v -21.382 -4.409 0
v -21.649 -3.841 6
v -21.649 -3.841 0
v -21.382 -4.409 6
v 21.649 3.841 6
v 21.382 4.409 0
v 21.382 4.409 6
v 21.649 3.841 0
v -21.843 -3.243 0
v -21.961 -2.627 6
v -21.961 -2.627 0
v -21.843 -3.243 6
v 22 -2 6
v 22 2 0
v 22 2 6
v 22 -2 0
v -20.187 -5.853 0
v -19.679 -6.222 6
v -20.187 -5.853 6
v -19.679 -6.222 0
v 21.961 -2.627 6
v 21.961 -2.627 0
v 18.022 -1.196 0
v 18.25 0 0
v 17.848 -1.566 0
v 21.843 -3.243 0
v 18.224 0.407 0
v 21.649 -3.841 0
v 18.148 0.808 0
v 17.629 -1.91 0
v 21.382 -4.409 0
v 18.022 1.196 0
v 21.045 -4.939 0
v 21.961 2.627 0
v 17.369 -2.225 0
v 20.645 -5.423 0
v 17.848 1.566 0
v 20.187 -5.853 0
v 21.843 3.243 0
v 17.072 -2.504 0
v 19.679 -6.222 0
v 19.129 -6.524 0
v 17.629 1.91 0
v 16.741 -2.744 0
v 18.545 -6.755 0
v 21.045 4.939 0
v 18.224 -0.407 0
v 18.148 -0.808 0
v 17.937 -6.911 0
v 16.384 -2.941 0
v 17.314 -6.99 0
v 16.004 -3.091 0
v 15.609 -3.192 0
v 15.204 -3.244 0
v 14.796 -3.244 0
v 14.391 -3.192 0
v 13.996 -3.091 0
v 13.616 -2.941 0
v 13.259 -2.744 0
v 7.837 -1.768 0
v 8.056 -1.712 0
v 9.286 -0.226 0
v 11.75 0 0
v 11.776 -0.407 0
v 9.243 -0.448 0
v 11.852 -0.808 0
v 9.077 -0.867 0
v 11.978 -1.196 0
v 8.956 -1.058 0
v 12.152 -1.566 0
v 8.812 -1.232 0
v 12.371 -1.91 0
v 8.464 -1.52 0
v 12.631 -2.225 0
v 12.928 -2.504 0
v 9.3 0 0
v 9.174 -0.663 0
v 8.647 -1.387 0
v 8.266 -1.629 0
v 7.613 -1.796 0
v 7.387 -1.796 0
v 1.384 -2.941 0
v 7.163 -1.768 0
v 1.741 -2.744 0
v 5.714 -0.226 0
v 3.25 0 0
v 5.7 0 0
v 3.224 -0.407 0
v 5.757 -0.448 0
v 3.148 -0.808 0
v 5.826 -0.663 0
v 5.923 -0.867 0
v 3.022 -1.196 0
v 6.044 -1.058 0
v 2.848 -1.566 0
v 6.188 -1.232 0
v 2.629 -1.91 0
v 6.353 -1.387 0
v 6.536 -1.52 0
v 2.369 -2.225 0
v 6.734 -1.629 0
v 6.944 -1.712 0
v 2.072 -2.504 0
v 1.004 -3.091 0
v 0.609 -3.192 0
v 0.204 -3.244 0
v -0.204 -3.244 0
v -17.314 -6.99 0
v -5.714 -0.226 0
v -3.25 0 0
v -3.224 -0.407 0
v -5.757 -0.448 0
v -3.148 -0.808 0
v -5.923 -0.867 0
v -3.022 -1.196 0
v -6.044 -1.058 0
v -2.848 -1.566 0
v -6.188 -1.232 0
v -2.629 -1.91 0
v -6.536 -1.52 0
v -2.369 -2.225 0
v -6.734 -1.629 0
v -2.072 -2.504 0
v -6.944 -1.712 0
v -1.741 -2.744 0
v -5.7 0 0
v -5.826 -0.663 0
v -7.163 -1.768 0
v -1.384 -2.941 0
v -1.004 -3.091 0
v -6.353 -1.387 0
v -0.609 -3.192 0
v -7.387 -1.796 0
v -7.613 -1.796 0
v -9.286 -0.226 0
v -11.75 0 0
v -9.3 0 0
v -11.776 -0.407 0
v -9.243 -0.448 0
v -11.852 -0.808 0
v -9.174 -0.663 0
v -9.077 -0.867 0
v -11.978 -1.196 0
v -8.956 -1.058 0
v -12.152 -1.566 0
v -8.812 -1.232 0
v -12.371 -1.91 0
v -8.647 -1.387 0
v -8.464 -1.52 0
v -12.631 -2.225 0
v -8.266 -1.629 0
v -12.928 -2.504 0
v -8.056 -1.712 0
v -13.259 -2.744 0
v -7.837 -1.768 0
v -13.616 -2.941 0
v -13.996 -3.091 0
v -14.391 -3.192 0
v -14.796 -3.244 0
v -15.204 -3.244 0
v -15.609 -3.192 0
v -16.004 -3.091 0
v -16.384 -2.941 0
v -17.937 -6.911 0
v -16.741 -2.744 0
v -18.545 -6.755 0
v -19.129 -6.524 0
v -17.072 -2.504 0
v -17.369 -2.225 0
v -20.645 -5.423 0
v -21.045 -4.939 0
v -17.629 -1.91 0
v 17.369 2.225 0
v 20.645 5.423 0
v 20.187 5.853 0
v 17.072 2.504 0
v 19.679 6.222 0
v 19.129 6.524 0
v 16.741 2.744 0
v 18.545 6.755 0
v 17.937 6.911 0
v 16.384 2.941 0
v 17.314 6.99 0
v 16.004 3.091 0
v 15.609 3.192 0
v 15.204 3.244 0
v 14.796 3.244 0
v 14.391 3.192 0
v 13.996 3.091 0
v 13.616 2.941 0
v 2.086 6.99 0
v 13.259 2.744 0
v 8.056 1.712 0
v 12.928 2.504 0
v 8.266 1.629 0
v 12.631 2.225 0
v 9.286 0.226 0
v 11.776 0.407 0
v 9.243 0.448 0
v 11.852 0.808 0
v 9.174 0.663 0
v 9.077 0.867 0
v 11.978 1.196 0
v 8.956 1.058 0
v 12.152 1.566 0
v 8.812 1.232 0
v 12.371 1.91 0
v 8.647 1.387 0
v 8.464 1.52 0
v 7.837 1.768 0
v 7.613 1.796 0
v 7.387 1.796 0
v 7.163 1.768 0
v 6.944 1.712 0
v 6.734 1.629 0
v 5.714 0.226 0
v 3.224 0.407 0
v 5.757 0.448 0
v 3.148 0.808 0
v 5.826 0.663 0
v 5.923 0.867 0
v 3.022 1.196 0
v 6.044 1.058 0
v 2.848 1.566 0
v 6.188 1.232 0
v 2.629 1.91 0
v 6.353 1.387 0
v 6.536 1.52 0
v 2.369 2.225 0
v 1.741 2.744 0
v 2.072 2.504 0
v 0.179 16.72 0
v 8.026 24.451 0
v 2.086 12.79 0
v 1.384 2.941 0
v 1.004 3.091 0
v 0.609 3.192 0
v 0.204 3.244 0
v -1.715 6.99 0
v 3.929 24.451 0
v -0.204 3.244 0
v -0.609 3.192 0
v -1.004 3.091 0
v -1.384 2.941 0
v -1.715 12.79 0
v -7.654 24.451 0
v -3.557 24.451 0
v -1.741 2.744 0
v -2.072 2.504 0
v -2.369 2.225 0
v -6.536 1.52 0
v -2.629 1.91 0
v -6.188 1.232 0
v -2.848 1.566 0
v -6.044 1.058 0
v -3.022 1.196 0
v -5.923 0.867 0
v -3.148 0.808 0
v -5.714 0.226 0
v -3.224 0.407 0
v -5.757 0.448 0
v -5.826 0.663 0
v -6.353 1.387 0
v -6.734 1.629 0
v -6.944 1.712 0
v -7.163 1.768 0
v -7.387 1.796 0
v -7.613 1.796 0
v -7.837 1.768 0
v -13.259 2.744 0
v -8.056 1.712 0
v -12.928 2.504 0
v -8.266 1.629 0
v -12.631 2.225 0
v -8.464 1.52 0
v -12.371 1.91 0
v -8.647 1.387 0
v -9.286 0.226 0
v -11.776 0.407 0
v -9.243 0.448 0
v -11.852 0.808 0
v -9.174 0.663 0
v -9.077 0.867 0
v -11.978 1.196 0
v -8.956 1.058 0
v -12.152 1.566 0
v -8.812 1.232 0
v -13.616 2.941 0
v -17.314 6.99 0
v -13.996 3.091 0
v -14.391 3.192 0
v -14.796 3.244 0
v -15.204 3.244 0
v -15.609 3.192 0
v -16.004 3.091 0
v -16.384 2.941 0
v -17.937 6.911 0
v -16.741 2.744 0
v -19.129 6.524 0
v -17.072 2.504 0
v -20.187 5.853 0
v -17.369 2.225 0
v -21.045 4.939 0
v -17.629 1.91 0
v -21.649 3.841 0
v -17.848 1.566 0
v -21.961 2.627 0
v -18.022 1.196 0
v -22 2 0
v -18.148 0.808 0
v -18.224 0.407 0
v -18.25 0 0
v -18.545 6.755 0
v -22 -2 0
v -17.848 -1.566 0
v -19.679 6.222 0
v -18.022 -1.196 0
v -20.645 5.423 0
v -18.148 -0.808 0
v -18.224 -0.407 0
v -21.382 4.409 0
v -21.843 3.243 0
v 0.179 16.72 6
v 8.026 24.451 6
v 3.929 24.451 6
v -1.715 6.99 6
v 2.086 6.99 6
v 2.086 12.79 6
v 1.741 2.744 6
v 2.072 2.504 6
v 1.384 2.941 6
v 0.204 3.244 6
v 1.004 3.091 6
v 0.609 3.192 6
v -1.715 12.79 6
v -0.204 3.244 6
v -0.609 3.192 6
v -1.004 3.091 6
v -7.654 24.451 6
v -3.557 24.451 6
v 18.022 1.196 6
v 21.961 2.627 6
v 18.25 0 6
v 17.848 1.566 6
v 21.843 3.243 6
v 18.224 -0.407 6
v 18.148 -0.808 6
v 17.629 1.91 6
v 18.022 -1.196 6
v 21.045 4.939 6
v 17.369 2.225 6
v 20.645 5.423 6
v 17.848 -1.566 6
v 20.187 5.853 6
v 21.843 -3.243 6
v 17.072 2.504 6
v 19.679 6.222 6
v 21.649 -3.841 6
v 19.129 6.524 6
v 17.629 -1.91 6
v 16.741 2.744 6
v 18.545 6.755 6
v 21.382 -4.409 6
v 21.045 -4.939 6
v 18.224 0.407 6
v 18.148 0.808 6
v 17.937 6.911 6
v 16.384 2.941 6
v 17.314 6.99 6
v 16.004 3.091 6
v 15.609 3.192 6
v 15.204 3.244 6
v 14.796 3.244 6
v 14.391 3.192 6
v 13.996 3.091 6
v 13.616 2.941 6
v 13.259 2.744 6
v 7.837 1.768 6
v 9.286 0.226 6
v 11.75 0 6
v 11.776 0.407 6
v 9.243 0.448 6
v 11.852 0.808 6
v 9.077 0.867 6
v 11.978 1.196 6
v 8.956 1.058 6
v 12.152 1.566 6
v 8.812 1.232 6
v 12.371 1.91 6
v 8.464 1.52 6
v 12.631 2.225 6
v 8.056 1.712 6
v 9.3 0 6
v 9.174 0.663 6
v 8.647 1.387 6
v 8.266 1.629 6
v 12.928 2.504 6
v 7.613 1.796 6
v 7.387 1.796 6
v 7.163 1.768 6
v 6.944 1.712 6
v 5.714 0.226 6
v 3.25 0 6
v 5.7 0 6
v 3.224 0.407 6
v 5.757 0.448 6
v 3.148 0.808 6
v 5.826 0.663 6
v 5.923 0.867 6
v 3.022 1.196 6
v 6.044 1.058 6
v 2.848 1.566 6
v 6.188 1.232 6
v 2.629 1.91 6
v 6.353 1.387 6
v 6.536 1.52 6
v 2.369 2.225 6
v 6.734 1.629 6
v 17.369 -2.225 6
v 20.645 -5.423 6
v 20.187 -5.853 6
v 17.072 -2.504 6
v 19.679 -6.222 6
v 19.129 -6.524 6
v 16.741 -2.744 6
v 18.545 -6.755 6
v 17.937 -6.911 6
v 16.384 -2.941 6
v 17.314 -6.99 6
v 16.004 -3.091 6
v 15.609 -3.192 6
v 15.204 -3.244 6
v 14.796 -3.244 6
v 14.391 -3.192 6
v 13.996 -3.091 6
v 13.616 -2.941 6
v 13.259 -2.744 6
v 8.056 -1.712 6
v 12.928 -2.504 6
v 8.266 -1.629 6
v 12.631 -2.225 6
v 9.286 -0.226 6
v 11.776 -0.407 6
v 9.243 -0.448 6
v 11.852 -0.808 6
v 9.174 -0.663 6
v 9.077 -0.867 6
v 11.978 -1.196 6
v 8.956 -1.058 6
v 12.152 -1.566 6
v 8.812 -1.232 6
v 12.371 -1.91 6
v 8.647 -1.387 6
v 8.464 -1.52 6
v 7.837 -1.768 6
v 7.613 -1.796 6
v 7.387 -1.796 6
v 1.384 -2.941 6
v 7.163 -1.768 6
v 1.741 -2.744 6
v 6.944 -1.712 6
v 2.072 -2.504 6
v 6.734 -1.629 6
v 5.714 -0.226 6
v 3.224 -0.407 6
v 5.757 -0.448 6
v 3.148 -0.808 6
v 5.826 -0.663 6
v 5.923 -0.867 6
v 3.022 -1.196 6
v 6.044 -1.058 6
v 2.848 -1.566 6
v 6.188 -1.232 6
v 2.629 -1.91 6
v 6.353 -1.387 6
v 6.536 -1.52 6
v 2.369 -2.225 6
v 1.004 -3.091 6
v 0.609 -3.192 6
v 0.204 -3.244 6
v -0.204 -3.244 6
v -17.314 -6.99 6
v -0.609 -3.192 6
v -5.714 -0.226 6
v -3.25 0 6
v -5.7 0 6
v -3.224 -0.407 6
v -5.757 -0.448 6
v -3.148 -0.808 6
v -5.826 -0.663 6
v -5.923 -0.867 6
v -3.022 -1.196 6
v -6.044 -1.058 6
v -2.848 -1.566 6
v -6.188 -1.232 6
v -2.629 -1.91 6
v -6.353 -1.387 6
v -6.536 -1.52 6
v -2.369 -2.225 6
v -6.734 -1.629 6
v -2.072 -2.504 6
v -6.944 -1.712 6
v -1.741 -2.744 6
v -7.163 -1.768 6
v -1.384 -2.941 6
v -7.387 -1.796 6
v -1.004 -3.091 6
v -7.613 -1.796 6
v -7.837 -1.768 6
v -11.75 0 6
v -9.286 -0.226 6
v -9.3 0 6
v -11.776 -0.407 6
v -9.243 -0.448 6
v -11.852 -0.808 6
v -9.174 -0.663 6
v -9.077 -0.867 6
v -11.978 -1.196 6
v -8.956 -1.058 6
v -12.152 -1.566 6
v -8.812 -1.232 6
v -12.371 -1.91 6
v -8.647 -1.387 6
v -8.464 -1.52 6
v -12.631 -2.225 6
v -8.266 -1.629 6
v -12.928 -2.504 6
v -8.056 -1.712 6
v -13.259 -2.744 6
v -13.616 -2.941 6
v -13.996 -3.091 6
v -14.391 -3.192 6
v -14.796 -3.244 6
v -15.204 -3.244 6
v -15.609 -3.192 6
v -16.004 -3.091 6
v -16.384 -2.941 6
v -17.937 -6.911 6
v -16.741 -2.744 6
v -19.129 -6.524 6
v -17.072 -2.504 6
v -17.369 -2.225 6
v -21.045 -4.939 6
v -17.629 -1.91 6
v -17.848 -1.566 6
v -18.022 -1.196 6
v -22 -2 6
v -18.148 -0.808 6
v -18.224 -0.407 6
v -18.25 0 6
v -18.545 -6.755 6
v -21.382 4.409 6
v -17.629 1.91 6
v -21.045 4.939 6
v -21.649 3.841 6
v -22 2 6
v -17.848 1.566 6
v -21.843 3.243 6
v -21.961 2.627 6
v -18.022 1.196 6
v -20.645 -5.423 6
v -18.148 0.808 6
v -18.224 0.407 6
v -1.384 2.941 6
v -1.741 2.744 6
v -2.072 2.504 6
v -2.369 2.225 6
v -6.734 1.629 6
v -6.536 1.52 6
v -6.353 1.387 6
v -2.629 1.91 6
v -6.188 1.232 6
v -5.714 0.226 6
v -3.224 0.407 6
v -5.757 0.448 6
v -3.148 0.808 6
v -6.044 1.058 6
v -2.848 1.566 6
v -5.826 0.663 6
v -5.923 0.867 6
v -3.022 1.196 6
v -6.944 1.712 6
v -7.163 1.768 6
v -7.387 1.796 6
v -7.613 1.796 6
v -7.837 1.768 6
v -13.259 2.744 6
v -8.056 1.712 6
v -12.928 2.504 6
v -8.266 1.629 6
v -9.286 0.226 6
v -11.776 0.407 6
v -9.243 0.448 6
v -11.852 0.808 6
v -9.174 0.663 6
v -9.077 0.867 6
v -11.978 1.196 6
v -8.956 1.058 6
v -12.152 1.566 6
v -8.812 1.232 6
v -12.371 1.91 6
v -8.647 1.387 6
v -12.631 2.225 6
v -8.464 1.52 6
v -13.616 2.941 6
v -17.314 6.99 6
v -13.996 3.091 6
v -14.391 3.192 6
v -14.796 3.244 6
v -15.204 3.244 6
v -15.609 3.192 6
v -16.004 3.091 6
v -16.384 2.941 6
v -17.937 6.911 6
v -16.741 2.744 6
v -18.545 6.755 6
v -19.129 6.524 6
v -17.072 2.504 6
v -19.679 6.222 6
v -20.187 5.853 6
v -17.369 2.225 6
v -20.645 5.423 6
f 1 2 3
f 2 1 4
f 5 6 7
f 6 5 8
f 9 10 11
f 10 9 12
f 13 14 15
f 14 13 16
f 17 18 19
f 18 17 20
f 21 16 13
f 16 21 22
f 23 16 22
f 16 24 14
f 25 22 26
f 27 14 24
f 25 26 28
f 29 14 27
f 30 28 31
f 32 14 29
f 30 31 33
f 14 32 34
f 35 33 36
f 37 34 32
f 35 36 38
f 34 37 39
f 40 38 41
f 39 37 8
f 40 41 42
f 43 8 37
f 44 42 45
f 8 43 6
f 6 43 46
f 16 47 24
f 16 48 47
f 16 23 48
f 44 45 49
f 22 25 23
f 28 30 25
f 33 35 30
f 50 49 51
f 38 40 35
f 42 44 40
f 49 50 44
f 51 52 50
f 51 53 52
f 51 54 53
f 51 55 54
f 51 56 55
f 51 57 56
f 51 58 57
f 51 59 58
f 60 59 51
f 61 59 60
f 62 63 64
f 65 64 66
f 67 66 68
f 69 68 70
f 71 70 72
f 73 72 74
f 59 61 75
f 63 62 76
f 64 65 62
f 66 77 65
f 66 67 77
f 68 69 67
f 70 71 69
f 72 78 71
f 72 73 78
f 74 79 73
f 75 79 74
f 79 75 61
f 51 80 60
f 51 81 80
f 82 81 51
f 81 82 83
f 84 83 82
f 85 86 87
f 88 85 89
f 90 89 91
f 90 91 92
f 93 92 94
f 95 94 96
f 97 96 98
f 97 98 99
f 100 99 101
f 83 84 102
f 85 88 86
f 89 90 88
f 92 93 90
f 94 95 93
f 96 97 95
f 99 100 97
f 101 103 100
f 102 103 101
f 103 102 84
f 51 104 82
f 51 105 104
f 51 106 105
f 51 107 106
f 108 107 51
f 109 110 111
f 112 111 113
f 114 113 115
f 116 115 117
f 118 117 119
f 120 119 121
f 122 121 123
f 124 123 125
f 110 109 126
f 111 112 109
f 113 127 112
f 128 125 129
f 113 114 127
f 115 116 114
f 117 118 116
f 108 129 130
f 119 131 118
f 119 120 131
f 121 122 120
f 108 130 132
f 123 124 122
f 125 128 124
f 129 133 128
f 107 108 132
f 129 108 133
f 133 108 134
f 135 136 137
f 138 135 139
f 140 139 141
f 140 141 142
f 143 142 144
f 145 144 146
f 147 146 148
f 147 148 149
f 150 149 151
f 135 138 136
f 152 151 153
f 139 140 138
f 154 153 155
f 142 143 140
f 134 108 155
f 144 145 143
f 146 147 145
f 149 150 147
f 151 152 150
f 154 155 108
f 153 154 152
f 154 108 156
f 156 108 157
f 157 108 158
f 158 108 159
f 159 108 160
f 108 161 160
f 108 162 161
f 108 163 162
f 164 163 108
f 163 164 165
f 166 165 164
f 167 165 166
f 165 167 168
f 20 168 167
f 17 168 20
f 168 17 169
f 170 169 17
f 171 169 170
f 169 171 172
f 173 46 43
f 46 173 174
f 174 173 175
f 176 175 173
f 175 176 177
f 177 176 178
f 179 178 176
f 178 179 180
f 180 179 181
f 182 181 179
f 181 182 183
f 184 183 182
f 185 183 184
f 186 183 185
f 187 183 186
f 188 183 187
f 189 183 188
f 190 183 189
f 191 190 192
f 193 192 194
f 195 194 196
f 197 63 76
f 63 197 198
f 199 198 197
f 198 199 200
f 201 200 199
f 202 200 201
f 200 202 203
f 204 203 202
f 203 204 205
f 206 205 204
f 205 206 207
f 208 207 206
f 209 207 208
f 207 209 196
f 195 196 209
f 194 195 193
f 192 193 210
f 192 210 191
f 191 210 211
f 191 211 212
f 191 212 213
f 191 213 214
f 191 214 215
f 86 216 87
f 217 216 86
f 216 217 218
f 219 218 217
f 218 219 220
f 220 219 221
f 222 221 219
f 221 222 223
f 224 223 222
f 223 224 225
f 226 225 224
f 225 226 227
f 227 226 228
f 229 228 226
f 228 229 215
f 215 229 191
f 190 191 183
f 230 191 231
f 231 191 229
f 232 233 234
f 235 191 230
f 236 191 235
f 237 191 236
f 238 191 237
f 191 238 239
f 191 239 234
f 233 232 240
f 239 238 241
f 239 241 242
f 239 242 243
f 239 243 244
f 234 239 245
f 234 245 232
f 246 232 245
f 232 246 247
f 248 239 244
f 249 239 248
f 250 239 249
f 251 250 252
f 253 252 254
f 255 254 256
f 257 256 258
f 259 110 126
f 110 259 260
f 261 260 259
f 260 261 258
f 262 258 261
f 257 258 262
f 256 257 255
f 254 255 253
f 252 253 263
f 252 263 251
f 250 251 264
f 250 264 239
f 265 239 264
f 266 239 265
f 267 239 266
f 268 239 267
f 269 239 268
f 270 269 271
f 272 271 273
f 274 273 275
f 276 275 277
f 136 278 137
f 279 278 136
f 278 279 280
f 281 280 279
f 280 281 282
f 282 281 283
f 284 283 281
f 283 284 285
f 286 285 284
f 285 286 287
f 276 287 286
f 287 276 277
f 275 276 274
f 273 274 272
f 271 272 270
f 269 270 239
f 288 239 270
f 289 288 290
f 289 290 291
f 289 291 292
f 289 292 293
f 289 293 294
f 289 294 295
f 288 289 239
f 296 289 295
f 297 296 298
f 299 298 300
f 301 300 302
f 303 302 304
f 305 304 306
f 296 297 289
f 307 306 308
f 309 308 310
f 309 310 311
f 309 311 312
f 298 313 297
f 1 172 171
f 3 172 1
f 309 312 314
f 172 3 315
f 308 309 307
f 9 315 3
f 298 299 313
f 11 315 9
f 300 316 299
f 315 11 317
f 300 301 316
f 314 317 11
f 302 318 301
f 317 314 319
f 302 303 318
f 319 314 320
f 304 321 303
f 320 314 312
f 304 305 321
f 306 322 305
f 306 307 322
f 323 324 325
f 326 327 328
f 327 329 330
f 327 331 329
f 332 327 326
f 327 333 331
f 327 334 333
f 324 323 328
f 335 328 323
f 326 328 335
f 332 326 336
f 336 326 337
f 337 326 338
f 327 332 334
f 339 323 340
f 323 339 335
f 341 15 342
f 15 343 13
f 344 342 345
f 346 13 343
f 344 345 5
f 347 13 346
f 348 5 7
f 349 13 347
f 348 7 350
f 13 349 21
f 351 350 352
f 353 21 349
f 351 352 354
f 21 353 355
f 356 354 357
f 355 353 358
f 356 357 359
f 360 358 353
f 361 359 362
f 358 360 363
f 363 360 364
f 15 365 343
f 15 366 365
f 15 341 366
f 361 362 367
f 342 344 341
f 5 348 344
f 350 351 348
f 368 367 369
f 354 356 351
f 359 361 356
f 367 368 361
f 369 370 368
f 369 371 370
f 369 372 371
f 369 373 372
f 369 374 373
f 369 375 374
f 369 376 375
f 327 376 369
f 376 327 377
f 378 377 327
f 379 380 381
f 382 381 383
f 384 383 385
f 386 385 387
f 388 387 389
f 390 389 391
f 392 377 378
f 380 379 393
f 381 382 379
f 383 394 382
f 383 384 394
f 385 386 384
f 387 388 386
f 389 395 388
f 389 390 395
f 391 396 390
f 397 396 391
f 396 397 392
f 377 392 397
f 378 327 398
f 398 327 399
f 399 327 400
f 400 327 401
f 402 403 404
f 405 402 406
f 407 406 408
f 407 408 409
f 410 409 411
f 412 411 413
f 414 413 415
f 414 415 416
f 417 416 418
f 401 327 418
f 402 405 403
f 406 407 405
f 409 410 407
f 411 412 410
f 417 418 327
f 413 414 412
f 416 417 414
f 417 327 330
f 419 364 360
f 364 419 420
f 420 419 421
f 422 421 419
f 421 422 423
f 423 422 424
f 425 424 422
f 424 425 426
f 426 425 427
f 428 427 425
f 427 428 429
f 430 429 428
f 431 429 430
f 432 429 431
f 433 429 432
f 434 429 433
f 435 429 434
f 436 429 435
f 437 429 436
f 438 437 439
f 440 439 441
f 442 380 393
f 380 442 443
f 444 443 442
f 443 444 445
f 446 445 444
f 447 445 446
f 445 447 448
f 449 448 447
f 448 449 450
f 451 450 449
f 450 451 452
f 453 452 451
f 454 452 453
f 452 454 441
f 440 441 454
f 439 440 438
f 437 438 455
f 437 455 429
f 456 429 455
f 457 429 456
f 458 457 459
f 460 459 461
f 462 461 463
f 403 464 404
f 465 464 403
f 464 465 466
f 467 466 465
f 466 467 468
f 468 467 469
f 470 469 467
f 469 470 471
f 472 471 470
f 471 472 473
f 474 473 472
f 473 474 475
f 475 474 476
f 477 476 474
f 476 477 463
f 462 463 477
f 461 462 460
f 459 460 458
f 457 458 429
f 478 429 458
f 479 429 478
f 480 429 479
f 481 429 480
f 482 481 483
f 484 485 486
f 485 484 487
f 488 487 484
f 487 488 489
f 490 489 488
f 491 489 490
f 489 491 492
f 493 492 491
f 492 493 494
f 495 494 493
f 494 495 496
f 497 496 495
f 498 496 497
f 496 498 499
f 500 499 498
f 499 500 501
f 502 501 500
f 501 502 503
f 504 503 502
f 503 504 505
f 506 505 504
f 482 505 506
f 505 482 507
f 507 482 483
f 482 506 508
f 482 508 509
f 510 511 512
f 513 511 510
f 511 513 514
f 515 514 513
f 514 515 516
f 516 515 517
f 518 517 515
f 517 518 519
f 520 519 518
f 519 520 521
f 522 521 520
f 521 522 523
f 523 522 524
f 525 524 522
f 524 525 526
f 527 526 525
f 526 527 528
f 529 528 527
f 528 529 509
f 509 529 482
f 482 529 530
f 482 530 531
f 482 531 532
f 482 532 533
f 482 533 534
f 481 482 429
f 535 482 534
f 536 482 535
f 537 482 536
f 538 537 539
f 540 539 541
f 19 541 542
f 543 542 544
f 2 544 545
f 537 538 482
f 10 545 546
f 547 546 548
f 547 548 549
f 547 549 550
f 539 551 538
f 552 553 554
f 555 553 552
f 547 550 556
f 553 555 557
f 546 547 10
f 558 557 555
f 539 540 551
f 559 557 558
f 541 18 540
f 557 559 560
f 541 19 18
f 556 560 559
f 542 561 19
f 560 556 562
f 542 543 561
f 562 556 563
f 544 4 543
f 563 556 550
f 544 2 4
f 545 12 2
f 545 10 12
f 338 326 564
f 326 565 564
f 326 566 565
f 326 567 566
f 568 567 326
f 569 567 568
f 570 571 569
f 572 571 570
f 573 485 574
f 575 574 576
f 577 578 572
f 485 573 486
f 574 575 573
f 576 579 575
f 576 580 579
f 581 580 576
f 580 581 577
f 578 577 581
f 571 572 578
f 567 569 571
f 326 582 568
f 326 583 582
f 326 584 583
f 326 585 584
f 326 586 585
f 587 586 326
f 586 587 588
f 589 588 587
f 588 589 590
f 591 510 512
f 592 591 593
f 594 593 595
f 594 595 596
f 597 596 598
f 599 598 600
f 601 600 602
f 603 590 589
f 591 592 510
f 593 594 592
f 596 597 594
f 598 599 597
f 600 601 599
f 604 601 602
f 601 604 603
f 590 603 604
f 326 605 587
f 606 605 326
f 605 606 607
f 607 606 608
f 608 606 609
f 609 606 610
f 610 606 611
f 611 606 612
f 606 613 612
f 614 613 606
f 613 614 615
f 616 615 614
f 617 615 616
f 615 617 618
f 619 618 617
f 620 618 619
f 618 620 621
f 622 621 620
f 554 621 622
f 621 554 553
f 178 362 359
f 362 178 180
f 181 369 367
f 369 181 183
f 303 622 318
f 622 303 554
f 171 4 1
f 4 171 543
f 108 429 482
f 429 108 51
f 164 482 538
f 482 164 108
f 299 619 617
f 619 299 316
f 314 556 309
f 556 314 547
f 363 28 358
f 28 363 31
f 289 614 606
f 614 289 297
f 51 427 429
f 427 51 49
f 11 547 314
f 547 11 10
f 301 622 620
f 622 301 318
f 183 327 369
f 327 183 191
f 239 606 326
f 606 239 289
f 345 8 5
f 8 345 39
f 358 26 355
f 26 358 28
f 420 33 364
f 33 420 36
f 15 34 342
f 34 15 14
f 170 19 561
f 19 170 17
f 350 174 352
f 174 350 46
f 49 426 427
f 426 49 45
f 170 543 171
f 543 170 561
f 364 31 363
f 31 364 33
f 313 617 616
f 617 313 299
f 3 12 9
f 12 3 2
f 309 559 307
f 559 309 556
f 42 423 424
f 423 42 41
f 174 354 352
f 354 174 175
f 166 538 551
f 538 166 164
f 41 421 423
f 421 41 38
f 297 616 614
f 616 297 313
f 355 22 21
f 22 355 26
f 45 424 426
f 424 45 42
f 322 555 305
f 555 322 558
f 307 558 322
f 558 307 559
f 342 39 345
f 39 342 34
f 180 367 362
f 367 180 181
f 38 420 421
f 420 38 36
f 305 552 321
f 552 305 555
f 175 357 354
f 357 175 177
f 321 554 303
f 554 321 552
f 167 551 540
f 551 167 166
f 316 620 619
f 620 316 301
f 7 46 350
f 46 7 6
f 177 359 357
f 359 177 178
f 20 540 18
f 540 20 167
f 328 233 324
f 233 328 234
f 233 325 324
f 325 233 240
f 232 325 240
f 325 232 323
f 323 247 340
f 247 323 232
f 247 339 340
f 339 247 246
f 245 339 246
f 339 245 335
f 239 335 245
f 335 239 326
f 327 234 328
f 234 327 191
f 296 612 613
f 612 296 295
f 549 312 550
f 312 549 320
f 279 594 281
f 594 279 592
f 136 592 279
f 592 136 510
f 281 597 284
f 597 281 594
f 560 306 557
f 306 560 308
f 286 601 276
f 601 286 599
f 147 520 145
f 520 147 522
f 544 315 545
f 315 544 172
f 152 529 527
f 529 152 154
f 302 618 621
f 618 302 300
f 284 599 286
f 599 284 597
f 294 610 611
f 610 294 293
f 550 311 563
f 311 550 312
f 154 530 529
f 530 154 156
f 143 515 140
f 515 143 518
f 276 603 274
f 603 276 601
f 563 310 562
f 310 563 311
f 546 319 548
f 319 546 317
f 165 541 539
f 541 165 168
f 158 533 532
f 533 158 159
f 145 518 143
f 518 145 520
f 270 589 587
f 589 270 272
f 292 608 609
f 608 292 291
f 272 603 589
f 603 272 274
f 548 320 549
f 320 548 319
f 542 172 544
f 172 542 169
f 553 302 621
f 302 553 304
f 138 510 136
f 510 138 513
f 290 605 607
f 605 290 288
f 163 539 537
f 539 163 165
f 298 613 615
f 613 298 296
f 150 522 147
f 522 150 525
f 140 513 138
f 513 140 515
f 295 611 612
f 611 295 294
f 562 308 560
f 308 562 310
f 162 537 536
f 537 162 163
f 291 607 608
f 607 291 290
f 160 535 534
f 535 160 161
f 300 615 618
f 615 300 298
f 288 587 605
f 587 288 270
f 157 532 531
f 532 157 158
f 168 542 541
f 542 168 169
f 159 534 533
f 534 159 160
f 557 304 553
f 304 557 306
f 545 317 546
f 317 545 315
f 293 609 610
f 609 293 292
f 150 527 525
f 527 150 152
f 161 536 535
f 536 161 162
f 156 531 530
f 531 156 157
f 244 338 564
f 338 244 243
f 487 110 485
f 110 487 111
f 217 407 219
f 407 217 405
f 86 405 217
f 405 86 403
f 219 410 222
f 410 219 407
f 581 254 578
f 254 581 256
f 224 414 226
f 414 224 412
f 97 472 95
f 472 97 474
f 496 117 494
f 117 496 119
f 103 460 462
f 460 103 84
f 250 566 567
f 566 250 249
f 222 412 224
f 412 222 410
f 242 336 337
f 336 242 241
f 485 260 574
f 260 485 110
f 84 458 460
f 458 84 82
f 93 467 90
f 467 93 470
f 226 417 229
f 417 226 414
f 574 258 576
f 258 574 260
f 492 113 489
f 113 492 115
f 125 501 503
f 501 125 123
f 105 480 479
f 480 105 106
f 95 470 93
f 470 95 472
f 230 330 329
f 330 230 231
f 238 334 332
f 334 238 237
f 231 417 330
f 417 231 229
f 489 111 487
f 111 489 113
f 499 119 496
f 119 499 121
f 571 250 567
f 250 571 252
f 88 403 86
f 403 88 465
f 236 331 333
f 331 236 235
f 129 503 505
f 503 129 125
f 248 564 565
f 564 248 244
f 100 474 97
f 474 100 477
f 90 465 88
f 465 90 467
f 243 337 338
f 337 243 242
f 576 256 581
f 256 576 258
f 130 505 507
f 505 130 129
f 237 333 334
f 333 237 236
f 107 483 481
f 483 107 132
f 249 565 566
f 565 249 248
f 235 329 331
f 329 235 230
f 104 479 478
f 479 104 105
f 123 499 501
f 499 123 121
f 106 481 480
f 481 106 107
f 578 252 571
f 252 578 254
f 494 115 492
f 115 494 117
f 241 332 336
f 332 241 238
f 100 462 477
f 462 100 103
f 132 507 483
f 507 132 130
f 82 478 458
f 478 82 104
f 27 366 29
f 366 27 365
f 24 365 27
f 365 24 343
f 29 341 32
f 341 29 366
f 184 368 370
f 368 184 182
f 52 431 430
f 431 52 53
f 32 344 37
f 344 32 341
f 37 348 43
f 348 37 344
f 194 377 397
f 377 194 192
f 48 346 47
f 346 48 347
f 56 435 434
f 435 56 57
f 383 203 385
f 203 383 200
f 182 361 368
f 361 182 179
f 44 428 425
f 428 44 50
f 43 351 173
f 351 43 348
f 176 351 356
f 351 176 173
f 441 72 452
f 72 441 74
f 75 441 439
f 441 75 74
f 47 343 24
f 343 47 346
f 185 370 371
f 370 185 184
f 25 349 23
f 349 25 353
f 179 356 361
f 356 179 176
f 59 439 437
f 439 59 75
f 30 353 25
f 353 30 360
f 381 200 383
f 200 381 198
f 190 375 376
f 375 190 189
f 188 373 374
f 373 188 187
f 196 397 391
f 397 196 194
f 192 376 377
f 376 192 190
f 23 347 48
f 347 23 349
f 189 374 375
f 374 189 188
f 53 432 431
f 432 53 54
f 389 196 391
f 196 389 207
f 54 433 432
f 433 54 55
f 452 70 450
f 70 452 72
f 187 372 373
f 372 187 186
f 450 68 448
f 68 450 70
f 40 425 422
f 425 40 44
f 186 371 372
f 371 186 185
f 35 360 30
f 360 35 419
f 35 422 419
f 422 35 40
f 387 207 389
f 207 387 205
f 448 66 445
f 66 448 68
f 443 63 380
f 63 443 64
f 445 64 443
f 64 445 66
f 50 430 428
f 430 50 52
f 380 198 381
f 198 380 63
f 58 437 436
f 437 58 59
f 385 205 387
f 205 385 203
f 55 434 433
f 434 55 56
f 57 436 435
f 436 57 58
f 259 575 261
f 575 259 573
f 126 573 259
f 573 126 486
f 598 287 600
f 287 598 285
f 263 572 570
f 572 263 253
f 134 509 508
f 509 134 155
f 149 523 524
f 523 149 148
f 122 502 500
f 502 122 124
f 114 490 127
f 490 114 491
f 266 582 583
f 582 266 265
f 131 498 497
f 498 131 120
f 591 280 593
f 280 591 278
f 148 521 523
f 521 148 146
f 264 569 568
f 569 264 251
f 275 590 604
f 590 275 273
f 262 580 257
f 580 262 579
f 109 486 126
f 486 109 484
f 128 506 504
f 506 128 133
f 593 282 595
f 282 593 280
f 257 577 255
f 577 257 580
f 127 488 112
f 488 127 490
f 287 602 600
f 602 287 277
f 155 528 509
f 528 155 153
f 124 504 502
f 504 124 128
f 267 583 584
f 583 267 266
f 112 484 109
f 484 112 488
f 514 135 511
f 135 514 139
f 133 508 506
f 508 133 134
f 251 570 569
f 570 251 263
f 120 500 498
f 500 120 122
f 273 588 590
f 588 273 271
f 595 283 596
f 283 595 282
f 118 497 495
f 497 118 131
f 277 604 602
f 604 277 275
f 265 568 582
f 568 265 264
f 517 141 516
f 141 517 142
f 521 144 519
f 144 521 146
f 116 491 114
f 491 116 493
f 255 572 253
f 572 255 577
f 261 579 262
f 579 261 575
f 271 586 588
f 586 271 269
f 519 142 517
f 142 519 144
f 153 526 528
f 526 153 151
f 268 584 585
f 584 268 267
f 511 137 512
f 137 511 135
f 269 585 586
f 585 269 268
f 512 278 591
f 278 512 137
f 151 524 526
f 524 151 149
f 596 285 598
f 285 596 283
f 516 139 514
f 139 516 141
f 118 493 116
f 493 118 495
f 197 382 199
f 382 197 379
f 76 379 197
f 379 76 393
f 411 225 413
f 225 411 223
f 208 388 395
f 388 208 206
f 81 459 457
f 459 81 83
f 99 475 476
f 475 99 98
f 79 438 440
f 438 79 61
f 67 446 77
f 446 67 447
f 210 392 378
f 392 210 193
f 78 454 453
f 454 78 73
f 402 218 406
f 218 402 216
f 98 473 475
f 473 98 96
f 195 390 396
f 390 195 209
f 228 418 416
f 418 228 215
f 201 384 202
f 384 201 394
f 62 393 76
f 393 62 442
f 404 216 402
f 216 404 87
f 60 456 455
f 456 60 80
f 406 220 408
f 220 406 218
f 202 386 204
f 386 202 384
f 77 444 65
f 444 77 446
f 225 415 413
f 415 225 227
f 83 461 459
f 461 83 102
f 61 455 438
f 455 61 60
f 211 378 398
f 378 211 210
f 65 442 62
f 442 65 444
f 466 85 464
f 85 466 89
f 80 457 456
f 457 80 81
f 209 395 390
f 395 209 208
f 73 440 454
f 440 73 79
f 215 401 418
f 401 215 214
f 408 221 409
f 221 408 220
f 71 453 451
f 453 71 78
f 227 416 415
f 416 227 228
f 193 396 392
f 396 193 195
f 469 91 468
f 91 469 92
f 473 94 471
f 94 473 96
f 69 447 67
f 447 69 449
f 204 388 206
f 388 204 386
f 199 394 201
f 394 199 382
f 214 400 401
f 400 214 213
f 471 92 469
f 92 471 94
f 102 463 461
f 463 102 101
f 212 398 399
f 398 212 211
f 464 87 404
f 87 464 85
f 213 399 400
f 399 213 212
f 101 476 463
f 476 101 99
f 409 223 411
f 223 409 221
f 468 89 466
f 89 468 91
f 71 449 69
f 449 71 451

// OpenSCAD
$fn = 50;


difference() {
	union() {
		hull() {
			translate(v = [-17.0000000000, 2.0000000000, 0]) {
				cylinder(h = 6, r = 5);
			}
			translate(v = [17.0000000000, 2.0000000000, 0]) {
				cylinder(h = 6, r = 5);
			}
			translate(v = [-17.0000000000, -2.0000000000, 0]) {
				cylinder(h = 6, r = 5);
			}
			translate(v = [17.0000000000, -2.0000000000, 0]) {
				cylinder(h = 6, r = 5);
			}
		}
		translate(v = [0, 24, 0]) {
			linear_extrude(height = 6) {
				text(font = "DejaVu Sans Mono:style=Bold", halign = "center", size = 19.0000000000, text = "Y", valign = "top");
			}
		}
	}
	union() {
		translate(v = [-15.0000000000, 0.0000000000, 0]) {
			translate(v = [0, 0, -100]) {
				cylinder(h = 200, r = 3.2500000000);
			}
		}
		translate(v = [0, 0, -100]) {
			cylinder(h = 200, r = 3.2500000000);
		}
		translate(v = [15.0000000000, 0.0000000000, 0]) {
			translate(v = [0, 0, -100]) {
				cylinder(h = 200, r = 3.2500000000);
			}
		}
		translate(v = [-15.0000000000, 0.0000000000, 0]) {
			translate(v = [0, 0, -100]) {
				cylinder(h = 200, r = 1.8000000000);
			}
		}
		translate(v = [-7.5000000000, 0.0000000000, 0]) {
			translate(v = [0, 0, -100]) {
				cylinder(h = 200, r = 1.8000000000);
			}
		}
		translate(v = [0, 0, -100]) {
			cylinder(h = 200, r = 1.8000000000);
		}
		translate(v = [7.5000000000, 0.0000000000, 0]) {
			translate(v = [0, 0, -100]) {
				cylinder(h = 200, r = 1.8000000000);
			}
		}
		translate(v = [15.0000000000, 0.0000000000, 0]) {
			translate(v = [0, 0, -100]) {
				cylinder(h = 200, r = 1.8000000000);
			}
		}
	}
}
